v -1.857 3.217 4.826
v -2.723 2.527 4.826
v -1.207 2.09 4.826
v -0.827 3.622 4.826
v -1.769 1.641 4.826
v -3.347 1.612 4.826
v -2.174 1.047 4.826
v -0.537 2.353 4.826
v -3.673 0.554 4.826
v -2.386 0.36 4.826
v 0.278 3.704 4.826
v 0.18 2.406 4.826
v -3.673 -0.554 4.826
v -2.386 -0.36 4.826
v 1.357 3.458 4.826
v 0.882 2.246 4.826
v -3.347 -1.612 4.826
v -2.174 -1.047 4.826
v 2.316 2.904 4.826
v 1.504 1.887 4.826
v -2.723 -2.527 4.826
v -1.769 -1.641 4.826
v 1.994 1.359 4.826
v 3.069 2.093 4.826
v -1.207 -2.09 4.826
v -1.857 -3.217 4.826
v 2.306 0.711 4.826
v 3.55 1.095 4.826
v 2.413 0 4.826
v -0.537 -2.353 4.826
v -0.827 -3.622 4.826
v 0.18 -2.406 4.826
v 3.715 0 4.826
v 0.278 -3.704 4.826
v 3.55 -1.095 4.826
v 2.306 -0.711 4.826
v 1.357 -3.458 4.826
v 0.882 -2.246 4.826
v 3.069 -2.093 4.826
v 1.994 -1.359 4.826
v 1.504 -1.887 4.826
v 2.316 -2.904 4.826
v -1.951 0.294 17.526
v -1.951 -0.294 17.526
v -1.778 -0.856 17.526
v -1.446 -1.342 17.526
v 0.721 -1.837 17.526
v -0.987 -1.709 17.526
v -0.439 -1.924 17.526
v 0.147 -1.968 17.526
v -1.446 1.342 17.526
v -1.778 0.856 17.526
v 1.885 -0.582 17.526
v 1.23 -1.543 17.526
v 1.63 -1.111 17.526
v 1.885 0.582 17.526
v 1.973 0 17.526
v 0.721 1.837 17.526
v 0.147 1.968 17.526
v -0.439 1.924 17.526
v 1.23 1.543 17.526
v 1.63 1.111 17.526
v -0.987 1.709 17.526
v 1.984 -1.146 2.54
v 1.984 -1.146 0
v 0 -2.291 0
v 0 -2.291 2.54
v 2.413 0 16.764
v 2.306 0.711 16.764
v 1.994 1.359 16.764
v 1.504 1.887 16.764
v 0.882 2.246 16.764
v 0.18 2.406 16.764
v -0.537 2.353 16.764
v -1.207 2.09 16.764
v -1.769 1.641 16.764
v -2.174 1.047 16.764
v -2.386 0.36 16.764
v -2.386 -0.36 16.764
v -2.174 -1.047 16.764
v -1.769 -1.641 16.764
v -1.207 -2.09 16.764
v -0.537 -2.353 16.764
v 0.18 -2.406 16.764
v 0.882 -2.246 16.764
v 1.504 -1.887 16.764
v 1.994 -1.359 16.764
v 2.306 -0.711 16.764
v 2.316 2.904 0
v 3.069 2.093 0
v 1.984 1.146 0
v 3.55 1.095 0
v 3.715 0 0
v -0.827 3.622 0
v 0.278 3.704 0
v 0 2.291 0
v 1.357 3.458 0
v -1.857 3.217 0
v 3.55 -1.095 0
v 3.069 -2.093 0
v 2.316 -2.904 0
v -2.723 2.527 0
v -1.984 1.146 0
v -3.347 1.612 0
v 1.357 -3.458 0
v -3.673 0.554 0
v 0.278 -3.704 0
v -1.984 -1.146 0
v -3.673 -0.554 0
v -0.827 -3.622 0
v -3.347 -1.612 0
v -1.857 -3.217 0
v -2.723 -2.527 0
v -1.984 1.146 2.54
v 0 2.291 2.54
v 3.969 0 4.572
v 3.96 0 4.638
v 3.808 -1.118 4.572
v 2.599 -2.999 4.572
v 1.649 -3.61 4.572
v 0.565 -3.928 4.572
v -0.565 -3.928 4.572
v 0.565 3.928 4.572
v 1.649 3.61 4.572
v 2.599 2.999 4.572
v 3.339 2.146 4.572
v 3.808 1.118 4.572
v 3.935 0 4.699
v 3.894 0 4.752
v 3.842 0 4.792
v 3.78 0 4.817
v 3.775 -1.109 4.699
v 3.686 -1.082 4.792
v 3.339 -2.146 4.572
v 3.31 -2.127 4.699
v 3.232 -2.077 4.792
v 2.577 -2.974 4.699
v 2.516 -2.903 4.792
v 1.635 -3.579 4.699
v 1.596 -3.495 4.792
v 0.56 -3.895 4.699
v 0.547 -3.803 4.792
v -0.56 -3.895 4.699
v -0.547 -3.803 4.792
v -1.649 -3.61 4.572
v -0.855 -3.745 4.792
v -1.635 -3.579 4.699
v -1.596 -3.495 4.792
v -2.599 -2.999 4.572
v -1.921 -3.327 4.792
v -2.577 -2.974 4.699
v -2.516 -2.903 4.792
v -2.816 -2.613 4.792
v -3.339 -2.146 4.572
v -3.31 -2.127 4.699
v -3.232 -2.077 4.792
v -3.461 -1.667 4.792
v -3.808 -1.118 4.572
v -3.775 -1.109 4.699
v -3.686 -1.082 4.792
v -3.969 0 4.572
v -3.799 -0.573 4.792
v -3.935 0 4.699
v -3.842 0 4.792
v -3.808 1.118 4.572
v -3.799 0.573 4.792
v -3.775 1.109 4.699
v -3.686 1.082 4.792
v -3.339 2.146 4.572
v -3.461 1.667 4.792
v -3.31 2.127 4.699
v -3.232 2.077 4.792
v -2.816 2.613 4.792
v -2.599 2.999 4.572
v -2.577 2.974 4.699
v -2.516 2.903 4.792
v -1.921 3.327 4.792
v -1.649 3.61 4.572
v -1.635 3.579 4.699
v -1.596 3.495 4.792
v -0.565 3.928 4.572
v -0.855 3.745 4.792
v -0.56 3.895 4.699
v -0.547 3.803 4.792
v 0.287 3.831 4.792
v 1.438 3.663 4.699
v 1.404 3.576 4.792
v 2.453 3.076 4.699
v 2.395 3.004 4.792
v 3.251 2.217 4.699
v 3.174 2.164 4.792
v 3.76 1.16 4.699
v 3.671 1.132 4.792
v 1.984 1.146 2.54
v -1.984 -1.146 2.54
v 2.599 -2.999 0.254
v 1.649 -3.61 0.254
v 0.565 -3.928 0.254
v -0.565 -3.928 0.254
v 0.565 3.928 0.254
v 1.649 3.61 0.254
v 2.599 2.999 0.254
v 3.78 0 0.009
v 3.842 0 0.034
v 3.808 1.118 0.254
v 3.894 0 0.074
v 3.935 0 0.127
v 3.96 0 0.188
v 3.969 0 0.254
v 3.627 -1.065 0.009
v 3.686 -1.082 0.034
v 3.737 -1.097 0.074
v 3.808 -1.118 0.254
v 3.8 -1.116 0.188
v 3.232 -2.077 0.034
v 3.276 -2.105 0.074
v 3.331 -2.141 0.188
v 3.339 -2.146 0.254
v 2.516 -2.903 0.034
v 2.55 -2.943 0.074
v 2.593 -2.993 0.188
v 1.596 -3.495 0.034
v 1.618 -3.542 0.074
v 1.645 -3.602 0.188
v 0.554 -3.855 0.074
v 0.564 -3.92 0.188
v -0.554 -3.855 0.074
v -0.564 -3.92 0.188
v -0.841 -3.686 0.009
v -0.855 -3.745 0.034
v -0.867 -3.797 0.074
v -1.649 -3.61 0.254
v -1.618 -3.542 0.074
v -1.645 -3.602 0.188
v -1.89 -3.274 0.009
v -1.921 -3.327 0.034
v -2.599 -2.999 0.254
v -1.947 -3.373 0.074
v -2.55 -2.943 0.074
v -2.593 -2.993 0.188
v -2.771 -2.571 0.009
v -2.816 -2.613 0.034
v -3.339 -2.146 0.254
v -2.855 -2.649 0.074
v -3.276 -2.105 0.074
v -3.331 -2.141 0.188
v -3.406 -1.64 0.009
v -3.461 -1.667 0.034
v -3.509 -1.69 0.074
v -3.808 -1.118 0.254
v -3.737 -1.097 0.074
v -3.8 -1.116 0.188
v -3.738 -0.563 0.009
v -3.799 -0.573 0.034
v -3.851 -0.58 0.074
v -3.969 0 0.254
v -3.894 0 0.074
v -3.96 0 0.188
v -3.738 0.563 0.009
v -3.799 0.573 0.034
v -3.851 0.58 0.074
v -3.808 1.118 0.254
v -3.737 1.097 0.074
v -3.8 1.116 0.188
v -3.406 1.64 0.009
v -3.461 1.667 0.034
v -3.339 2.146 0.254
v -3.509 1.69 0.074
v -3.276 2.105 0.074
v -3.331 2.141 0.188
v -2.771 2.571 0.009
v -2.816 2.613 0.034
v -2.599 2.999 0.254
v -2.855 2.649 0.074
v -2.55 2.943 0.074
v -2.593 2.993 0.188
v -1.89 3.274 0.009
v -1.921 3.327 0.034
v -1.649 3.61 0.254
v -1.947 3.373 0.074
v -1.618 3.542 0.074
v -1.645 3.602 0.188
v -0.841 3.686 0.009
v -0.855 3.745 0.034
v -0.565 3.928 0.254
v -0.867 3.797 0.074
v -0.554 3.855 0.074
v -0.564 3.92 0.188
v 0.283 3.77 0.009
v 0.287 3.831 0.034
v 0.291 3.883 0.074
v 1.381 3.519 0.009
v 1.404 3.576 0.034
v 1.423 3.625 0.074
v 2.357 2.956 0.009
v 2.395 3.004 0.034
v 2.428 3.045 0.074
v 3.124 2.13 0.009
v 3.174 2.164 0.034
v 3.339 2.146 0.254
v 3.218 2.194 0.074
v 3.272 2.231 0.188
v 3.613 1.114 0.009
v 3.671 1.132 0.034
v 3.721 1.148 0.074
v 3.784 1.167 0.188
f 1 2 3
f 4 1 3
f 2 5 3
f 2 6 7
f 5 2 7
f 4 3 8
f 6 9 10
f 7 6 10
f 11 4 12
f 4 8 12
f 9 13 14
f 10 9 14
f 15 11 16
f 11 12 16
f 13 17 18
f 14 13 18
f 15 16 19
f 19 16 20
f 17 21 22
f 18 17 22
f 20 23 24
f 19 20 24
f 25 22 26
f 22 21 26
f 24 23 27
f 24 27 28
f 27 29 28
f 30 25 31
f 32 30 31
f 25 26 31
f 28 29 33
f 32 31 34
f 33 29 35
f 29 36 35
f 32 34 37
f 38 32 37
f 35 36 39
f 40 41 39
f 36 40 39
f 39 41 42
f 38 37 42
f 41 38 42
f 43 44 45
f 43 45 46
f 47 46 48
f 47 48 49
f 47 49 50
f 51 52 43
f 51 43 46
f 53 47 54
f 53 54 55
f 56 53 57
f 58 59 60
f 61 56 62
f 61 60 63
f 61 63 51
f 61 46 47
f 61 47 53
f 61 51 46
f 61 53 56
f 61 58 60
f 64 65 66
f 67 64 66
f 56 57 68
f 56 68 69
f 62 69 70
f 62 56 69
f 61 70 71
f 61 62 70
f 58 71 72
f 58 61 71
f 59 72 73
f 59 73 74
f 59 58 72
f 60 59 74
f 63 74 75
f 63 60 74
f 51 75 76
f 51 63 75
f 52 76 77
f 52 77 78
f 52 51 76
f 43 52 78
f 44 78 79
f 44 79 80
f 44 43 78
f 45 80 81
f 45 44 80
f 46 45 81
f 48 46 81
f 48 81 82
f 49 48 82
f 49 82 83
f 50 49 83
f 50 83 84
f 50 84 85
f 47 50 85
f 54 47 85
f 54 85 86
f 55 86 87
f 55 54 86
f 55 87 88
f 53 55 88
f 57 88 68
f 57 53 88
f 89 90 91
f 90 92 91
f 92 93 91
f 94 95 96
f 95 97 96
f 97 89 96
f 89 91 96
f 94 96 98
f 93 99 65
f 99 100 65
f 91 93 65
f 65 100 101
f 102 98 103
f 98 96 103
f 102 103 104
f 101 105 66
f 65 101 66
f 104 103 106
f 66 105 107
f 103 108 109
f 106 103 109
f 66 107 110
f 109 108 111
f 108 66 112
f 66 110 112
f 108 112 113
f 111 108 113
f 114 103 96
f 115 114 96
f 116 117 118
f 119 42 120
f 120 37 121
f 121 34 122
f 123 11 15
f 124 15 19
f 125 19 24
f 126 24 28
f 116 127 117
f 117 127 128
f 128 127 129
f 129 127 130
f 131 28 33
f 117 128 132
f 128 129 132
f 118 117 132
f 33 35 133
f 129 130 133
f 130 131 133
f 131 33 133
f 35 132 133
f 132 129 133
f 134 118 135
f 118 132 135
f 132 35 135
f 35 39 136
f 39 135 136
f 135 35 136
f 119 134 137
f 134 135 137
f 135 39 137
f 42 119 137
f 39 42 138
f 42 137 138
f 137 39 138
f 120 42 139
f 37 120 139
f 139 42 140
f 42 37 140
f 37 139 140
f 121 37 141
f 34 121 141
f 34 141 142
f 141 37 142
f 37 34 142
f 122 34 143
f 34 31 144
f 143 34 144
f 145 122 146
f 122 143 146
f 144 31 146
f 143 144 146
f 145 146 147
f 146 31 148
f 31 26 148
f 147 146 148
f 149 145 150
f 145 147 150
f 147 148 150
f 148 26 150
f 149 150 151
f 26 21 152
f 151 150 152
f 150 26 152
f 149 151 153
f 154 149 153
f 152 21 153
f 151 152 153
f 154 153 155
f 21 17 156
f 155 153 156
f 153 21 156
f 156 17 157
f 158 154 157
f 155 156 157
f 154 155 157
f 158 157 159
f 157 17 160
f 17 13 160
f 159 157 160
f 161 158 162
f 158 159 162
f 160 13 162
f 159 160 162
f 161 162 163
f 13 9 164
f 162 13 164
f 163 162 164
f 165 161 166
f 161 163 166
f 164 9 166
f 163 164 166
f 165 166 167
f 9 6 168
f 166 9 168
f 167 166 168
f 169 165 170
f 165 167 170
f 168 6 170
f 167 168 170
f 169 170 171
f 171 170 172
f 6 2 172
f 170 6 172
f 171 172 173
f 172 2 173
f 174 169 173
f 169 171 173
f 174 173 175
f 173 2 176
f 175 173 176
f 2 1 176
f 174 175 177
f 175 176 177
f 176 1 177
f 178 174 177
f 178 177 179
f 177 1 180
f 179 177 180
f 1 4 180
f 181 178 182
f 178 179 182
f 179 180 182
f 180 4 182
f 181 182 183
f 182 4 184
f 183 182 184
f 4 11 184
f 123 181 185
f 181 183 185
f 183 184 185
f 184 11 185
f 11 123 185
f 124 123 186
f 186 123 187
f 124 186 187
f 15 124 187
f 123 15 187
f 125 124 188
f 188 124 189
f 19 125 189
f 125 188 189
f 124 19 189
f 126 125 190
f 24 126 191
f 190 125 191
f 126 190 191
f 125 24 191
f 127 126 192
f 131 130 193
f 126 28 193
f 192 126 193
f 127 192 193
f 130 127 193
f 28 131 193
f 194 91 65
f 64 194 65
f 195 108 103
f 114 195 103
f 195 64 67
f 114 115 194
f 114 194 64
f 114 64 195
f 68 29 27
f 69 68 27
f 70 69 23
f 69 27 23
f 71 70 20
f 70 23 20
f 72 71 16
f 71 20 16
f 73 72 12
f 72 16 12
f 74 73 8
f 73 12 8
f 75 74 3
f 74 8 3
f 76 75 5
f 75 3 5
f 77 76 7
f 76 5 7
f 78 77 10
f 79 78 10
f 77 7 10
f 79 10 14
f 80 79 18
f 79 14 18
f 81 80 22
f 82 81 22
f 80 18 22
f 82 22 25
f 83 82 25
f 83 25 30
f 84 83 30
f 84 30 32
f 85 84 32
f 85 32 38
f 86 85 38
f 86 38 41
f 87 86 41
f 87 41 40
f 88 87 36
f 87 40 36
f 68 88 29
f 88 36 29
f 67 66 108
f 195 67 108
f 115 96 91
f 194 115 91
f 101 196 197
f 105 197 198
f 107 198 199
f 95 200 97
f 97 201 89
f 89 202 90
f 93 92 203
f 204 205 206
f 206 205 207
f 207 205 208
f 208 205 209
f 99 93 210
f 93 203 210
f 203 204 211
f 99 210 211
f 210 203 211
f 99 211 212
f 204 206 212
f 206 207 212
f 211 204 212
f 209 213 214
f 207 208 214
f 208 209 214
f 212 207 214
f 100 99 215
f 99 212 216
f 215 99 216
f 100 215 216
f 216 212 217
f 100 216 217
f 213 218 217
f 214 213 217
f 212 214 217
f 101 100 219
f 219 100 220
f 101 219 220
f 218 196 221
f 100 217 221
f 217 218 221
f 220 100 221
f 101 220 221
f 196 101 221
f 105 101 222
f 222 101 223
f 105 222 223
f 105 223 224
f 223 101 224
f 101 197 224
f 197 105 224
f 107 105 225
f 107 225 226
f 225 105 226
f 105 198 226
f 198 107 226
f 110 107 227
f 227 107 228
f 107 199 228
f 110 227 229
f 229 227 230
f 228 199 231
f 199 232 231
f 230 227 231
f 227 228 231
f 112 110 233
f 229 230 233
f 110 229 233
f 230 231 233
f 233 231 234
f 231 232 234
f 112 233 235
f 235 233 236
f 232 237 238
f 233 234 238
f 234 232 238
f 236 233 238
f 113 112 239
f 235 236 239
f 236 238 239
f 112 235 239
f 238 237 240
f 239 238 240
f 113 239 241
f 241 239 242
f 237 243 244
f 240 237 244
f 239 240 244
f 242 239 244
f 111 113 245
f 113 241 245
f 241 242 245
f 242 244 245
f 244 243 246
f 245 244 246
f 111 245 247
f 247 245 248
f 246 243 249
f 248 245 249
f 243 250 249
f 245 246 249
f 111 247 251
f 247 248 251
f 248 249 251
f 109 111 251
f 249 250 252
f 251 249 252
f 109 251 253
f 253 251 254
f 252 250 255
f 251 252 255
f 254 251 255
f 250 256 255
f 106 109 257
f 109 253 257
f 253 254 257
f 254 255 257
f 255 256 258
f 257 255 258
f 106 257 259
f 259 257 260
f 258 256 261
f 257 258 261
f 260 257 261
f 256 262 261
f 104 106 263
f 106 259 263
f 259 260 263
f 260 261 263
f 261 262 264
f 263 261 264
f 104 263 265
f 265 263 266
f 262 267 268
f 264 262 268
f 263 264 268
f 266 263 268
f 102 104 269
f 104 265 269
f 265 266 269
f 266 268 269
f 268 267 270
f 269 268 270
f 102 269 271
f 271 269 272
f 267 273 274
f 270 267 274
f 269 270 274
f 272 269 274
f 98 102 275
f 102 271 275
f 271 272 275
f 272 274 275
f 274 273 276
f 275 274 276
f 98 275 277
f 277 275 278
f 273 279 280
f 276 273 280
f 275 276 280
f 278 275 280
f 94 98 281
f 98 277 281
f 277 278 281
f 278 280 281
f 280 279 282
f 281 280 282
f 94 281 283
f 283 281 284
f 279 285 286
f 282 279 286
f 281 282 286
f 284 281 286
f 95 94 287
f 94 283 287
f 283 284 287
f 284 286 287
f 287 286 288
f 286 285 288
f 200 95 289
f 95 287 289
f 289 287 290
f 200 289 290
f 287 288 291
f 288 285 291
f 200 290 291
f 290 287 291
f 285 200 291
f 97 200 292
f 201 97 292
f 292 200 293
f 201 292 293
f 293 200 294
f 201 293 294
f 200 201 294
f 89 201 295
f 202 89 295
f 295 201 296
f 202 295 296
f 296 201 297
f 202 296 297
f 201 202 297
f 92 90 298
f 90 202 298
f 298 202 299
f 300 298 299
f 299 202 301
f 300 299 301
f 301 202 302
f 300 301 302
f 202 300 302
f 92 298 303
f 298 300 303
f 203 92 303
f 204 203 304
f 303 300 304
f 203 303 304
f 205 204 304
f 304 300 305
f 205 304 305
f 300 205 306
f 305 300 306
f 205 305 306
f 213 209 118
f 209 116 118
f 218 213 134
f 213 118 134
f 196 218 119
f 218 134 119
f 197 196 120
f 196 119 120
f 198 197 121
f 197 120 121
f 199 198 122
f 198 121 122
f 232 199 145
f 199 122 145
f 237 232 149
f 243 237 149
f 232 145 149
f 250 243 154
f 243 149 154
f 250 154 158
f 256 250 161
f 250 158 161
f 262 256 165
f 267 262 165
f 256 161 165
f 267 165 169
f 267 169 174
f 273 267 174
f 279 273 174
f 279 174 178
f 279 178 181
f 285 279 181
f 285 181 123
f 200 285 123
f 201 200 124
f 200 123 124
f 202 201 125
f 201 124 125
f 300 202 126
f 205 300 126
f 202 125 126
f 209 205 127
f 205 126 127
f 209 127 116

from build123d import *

# Parameters (mm, degrees)
CUT_EXTRUDE1_DEPTH  = 2.54
SKETCH3_R           = 2.413
BOSS_EXTRUDE1_DEPTH = 12.7
CHAMFER1_SIZE       = 0.762
CHAMFER1_SIZE2      = 0.439940905


with BuildPart() as part:
    # Sketch1 → Revolve1 (revolve)
    with BuildSketch(Plane(origin=(0, 0, 0), x_dir=(1, 0, 0), z_dir=(0, 1, 0))):
        with BuildLine():
            Line((0, 0), (3.71475, 0))
            ThreePointArc((3.71475, 0), (3.894355122, -0.074394878), (3.96875, -0.254))
            Line((3.96875, -0.254), (3.96875, -4.572))
            ThreePointArc((3.96875, -4.572), (3.894355122, -4.751605122), (3.71475, -4.826))
            Line((3.71475, -4.826), (0, -4.826))
            Line((0, -4.826), (0, 0))
        make_face()
    revolve(axis=Axis((0, 0, 0), (0, 0, -1)))

    # Sketch2 → Cut-Extrude1 (cut)
    with BuildSketch(Plane(origin=(0, 0, 0), x_dir=(-1, 0, 0), z_dir=(0, 0, -1))):
        Polygon((0, 2.291358881), (-1.984375, 1.14567944), (-1.984375, -1.14567944), (0, -2.291358881), (1.984375, -1.14567944), (1.984375, 1.14567944), align=None)
    extrude(amount=-CUT_EXTRUDE1_DEPTH, mode=Mode.SUBTRACT)

    # Sketch3 → Boss-Extrude1 (add)
    with BuildSketch(Plane.XY.offset(4.826)):
        Circle(SKETCH3_R)
    extrude(amount=BOSS_EXTRUDE1_DEPTH)

    # Chamfer1
    chamfer1_edges = [part.edges().sort_by_distance(p)[0] for p in [
        (-2.413, 0, 17.526),
    ]]
    chamfer1_side = [part.faces().sort_by_distance(p)[0] for p in [
        (-2.413, 0, 11.176),
    ]]
    chamfer(chamfer1_edges, length=CHAMFER1_SIZE, length2=CHAMFER1_SIZE2, reference=chamfer1_side[0])


solid = part.part
